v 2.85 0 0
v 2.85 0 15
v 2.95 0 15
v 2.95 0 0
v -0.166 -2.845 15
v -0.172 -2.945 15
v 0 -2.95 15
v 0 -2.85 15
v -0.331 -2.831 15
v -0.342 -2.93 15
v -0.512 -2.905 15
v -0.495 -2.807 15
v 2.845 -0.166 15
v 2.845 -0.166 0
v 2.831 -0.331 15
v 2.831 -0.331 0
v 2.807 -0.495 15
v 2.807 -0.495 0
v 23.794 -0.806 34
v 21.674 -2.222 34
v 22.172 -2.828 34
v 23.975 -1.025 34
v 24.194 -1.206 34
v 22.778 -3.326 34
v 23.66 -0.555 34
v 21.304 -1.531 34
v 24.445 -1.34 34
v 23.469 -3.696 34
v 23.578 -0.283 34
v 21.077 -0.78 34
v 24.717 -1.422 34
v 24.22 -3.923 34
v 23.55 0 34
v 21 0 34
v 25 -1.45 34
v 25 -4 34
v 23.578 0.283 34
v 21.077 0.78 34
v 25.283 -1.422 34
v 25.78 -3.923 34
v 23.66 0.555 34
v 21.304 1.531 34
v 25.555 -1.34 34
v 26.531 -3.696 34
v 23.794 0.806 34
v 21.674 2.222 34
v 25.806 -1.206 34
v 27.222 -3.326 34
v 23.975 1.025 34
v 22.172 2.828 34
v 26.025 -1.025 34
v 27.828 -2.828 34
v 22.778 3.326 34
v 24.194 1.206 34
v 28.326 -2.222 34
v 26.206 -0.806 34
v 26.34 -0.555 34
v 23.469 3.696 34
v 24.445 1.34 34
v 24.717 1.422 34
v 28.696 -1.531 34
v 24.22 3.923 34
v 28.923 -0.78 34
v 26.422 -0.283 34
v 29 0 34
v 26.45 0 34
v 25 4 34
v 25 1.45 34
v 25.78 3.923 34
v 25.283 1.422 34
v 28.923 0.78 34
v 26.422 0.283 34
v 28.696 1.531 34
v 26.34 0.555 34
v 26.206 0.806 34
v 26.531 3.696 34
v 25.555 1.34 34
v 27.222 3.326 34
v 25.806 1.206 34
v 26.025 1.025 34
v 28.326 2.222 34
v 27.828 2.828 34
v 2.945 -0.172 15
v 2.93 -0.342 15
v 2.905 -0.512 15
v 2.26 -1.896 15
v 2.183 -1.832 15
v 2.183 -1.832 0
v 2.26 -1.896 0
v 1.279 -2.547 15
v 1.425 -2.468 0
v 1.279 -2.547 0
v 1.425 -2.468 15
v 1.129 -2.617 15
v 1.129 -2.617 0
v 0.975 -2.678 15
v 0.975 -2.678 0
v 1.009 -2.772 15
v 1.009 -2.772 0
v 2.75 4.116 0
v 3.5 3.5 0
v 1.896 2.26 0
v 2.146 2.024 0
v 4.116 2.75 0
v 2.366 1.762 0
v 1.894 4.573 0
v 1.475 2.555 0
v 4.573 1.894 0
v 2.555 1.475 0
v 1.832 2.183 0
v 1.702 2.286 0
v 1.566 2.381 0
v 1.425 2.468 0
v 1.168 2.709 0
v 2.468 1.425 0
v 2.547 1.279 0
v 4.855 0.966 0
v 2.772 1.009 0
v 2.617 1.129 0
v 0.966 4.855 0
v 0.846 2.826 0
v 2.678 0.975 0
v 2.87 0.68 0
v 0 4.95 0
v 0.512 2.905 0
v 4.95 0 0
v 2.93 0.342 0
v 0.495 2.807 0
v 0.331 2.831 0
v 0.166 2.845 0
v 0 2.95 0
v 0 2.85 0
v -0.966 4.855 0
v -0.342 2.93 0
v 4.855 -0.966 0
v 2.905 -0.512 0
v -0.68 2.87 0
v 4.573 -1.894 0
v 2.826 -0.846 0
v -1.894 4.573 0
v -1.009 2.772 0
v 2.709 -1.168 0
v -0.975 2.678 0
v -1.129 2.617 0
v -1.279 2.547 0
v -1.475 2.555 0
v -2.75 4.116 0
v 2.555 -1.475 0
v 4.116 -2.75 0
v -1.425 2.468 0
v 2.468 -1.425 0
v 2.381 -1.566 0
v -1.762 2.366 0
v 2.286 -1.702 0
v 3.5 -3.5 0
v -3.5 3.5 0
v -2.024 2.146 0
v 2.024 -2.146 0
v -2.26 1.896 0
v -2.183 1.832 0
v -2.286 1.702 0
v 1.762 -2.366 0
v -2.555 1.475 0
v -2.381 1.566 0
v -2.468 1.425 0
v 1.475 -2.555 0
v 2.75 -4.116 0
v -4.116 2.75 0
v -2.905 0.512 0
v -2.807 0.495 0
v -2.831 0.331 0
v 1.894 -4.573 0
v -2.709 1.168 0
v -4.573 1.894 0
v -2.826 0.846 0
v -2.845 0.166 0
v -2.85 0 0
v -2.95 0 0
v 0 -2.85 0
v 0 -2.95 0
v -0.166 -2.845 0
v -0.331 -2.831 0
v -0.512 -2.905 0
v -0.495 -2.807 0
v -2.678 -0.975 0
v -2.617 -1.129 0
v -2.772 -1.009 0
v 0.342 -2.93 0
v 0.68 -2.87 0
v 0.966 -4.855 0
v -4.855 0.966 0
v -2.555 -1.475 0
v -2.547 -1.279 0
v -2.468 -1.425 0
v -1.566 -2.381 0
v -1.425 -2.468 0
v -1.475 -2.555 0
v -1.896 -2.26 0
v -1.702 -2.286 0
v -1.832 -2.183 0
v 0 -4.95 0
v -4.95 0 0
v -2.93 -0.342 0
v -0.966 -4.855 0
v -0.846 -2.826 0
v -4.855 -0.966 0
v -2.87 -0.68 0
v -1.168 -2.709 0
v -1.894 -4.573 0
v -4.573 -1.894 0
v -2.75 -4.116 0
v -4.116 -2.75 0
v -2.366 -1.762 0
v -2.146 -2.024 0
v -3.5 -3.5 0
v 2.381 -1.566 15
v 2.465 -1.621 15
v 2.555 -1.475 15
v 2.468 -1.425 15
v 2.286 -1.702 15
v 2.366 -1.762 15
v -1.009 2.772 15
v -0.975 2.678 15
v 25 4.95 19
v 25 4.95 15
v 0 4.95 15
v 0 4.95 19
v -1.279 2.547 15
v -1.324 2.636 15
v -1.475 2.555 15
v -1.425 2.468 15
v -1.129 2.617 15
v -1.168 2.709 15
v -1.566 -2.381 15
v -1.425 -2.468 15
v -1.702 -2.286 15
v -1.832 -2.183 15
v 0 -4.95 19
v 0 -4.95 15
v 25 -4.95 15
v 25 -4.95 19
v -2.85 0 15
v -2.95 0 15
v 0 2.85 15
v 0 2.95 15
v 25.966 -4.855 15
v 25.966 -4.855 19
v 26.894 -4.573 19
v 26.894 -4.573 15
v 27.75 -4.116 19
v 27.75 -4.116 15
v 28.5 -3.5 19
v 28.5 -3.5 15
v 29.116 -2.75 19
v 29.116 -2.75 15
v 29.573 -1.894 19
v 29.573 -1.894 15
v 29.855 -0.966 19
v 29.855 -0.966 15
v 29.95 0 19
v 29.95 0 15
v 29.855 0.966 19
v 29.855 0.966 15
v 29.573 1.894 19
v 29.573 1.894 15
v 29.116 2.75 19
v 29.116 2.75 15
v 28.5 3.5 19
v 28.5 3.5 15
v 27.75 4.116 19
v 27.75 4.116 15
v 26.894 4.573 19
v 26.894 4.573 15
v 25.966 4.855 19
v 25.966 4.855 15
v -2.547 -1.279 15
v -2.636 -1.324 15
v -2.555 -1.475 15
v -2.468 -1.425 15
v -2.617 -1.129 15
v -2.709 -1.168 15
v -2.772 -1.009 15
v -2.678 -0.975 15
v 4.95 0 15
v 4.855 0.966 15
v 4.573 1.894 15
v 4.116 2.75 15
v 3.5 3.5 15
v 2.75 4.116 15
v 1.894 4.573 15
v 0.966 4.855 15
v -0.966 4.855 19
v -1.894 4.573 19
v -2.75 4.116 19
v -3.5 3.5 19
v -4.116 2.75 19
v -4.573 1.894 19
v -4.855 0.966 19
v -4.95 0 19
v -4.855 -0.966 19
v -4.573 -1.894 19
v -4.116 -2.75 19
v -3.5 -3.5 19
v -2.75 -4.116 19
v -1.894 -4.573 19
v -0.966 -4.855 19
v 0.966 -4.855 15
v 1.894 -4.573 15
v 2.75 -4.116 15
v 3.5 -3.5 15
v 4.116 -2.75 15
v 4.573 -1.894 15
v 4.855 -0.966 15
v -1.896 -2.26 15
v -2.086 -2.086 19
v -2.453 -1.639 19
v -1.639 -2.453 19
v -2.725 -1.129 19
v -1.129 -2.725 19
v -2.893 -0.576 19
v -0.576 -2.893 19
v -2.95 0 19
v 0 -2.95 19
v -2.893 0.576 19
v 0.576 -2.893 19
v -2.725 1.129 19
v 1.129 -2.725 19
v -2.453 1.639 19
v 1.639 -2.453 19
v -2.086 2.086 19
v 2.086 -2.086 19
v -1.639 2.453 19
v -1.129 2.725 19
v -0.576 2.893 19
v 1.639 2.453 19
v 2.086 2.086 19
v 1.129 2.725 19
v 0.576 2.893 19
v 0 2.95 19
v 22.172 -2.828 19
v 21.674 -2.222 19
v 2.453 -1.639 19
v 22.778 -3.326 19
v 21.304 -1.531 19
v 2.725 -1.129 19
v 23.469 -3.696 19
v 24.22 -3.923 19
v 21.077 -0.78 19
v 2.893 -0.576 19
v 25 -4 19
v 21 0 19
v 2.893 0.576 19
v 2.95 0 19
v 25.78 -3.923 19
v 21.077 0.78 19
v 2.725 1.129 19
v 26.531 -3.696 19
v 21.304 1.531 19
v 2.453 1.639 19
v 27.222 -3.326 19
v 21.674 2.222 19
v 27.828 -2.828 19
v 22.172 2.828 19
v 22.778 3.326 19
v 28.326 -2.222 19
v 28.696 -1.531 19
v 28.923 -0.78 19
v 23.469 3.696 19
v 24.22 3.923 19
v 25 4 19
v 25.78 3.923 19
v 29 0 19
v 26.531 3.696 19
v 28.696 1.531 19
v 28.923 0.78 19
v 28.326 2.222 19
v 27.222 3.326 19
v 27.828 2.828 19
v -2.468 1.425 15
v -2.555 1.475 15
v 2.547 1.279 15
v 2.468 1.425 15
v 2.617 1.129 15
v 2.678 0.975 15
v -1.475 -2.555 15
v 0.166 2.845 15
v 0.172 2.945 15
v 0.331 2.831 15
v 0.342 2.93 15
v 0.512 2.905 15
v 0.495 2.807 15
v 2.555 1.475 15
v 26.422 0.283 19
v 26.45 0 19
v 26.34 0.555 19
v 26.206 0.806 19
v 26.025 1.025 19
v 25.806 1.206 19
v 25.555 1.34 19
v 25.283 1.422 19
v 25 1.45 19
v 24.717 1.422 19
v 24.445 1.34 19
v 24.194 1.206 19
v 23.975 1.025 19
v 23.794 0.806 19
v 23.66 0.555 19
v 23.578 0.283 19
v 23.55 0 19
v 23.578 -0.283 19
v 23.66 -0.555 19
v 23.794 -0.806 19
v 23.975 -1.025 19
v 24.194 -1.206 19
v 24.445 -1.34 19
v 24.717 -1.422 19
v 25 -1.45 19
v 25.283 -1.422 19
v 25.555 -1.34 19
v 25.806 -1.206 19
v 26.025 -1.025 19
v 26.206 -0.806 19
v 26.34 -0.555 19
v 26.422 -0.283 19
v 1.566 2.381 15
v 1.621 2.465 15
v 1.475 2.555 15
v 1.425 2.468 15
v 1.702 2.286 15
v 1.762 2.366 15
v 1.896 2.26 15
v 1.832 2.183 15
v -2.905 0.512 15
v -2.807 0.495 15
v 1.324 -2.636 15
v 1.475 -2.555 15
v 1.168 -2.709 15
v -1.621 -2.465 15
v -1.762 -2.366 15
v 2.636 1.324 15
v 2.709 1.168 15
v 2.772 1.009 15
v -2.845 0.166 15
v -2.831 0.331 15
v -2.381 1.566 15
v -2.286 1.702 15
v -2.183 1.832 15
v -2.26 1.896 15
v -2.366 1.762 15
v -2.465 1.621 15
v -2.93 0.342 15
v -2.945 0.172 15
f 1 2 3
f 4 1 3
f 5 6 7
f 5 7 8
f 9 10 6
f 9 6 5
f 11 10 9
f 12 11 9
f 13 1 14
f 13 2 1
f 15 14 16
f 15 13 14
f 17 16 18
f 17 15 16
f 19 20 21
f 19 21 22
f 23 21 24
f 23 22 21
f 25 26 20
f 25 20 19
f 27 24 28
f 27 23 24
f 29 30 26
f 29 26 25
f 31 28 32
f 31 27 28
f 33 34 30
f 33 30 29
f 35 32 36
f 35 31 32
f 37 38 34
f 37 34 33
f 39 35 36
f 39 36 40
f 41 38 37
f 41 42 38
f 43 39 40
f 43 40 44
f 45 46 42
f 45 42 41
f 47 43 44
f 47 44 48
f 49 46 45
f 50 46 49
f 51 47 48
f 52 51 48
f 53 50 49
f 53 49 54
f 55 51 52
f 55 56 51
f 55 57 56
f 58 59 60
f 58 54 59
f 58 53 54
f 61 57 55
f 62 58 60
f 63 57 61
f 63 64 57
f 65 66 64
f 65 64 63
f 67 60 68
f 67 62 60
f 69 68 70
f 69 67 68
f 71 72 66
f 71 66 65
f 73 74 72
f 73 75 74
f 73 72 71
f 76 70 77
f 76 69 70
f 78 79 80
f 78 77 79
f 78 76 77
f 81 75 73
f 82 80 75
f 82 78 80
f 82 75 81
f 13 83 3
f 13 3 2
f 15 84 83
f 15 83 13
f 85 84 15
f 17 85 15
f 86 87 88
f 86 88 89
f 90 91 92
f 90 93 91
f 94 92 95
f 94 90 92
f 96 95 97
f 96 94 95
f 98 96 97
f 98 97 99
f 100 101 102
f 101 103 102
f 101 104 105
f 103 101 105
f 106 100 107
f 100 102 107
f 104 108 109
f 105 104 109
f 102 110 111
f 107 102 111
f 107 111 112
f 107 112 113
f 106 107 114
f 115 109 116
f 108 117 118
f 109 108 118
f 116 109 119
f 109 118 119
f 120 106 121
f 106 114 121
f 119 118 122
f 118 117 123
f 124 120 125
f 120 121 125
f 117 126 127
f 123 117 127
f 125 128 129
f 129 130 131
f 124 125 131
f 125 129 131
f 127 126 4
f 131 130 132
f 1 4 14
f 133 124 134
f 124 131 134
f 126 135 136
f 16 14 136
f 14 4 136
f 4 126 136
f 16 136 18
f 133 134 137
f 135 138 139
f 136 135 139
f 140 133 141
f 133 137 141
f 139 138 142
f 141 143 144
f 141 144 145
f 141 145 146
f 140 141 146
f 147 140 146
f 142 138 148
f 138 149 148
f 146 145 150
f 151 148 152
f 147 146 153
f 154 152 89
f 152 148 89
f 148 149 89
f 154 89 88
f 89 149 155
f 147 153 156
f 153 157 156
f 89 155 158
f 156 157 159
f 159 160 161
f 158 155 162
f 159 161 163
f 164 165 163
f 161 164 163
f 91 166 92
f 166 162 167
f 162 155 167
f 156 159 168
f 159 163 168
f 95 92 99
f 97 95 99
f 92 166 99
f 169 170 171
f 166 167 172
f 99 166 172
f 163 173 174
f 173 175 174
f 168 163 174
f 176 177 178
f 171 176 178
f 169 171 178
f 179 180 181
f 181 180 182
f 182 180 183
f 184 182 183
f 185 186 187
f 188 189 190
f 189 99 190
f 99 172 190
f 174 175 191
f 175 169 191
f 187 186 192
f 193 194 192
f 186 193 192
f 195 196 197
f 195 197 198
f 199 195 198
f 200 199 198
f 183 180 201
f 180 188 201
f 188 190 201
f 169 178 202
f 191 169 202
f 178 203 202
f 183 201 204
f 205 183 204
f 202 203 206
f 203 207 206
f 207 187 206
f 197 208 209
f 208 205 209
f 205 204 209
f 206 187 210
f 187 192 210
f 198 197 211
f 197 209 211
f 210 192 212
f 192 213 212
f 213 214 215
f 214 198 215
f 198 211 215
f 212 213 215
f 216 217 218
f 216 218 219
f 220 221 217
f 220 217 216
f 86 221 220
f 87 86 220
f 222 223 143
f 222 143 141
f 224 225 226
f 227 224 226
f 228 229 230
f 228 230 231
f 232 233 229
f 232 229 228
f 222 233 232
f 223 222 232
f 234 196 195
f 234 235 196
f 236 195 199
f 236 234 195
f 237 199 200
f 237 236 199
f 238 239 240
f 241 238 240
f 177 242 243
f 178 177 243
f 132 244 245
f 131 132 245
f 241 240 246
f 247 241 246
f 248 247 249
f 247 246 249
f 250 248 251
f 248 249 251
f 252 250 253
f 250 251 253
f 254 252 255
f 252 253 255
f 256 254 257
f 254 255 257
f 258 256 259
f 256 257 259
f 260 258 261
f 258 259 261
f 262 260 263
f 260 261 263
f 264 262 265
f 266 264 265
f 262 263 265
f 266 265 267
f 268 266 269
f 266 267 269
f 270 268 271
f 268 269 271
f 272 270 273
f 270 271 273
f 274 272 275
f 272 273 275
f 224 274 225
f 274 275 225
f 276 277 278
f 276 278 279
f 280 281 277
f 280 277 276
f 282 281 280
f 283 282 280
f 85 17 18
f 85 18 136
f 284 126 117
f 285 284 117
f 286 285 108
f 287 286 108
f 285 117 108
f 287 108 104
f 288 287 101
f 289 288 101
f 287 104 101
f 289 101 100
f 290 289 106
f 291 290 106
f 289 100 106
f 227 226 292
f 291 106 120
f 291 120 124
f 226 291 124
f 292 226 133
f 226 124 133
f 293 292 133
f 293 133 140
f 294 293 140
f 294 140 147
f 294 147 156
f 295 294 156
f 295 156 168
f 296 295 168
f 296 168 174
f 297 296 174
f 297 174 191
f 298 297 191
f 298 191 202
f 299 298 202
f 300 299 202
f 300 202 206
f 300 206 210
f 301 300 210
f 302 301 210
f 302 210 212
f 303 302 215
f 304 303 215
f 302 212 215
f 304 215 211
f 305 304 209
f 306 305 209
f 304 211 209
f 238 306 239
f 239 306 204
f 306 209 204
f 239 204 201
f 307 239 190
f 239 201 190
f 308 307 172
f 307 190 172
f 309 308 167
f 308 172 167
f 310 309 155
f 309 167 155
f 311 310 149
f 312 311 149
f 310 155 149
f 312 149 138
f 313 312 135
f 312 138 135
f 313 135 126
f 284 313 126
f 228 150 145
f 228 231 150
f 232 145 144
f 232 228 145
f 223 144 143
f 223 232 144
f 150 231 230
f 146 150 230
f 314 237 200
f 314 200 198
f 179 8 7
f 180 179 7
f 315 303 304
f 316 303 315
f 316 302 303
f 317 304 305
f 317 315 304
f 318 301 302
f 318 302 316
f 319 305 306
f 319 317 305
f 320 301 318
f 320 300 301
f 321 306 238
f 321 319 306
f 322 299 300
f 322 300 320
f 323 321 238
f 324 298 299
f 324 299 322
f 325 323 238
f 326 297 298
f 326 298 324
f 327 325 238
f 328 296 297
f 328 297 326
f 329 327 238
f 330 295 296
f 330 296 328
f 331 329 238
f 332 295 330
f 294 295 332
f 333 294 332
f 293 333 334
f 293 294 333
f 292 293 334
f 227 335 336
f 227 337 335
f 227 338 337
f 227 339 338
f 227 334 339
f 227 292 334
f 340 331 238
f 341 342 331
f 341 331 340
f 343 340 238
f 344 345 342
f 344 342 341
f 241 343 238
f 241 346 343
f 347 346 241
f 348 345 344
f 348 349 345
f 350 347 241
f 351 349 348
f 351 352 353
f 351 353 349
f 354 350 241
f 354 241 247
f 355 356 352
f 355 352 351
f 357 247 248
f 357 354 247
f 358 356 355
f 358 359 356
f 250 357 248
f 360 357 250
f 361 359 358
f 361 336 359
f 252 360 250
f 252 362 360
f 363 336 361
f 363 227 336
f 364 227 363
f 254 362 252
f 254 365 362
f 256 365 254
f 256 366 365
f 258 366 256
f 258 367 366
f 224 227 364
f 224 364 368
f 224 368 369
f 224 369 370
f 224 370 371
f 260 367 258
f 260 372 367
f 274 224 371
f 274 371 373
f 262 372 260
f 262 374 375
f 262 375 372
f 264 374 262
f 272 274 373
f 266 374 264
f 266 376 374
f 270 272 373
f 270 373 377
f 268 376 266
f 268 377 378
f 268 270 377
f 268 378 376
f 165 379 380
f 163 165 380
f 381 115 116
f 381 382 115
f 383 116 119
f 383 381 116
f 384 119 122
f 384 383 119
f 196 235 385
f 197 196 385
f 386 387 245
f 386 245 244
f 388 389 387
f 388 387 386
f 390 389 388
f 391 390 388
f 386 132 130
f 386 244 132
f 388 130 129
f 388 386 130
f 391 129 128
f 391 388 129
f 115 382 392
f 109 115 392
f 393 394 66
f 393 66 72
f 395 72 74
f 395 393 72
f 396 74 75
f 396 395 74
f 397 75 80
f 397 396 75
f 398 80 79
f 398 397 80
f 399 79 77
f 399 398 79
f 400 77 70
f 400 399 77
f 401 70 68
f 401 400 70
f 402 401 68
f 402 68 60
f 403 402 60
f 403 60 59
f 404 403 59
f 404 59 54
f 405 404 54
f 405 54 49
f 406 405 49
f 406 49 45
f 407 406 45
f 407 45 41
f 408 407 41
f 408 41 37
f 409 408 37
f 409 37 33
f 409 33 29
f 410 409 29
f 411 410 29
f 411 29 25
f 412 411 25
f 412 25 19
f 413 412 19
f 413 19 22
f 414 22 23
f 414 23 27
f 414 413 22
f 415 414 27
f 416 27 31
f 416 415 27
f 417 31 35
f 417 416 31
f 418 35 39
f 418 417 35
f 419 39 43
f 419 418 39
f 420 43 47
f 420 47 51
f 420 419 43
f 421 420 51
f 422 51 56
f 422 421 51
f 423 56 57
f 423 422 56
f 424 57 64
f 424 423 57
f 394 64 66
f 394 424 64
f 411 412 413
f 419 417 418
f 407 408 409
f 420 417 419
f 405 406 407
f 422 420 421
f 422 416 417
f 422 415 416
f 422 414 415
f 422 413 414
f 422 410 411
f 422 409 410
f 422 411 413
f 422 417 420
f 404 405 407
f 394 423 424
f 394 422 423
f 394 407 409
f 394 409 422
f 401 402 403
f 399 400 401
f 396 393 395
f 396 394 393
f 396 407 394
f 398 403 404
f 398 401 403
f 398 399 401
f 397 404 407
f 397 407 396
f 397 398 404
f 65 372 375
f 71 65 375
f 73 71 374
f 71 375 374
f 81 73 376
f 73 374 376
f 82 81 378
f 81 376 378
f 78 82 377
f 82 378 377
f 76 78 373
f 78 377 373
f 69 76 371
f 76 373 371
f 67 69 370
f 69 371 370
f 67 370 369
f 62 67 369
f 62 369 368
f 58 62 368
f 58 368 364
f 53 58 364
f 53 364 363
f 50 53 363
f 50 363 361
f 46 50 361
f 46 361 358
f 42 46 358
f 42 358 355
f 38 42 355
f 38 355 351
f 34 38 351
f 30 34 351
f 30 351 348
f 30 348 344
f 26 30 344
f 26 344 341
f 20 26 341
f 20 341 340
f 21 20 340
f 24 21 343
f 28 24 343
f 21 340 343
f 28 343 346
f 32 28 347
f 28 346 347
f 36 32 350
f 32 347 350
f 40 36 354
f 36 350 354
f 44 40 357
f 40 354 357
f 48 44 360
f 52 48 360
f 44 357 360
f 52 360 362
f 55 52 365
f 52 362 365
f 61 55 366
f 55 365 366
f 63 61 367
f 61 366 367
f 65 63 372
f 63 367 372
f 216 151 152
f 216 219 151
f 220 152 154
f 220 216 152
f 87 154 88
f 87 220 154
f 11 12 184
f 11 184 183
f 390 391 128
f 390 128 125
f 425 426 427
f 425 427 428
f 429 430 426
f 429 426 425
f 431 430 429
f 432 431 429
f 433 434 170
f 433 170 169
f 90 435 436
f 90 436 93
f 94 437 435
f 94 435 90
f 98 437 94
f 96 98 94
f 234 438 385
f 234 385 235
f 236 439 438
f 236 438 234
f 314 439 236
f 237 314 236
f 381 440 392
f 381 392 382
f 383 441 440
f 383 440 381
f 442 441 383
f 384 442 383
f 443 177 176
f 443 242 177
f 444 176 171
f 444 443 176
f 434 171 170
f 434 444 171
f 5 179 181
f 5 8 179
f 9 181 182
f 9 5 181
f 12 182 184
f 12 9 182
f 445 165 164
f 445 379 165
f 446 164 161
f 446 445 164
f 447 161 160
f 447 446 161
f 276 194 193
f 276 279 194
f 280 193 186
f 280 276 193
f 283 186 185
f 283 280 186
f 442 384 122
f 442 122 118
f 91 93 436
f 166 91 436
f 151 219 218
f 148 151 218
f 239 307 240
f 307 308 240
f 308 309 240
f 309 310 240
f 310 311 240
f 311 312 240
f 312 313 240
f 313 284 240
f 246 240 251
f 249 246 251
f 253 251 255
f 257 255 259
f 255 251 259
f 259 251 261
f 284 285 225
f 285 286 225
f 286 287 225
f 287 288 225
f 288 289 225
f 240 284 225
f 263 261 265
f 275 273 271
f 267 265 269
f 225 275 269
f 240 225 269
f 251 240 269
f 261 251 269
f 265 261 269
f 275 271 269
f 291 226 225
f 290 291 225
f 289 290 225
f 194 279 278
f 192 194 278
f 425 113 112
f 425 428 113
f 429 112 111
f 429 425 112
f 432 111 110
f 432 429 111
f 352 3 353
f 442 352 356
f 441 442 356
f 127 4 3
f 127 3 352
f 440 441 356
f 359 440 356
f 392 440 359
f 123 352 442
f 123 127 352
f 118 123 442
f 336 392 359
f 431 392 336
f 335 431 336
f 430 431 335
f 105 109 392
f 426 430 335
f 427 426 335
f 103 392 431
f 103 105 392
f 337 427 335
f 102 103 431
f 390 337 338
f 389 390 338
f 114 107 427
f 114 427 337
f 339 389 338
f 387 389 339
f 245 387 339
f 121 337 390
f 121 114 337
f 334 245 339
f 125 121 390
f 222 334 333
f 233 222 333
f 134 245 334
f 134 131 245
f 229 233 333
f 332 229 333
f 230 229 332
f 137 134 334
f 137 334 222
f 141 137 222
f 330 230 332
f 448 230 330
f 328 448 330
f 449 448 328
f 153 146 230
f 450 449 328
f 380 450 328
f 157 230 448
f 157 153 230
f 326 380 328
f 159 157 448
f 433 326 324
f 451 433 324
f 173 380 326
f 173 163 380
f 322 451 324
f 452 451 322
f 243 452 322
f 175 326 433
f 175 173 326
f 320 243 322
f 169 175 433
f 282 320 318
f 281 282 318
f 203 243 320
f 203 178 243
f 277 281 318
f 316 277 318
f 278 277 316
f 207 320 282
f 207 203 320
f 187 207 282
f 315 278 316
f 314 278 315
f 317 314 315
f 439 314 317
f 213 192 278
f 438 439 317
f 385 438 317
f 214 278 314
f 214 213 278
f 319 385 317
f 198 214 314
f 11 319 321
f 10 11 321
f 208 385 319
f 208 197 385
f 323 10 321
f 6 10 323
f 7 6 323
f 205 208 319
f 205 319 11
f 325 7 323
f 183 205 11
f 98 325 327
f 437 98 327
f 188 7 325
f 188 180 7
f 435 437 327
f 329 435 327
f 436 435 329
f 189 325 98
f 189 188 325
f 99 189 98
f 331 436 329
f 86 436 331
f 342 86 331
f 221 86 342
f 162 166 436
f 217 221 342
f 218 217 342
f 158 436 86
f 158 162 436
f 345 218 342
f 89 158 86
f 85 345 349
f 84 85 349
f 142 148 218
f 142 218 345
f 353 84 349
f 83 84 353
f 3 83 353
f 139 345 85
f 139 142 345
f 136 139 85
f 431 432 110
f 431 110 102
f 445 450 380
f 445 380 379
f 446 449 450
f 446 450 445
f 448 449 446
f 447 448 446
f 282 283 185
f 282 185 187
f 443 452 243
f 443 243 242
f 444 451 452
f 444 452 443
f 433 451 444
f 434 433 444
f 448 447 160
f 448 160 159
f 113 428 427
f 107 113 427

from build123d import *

# Parameters (mm, degrees)
SKETCH005_R        = 2.95
PAD005_DEPTH       = 4
SKETCH007_R        = 4
SKETCH007_R_2      = 1.45
PAD006_DEPTH       = 19
SKETCH016_R        = 4.95
SKETCH016_R_2      = 2.95
PAD015_DEPTH       = 15
SKETCH008_W        = 0.1
SKETCH008_H        = 15
REVOLUTION_ANGLE   = -10
POLARPATTERN_COUNT = 12


with BuildPart() as part:
    # Sketch005 → Pad005 (new body)
    with BuildSketch(Plane.XY.offset(15)):
        with BuildLine():
            ThreePointArc((0, 4.95), (-4.95, 0), (0, -4.95))
            Line((0, -4.95), (25, -4.95))
            ThreePointArc((25, -4.95), (29.95, 0), (25, 4.95))
            Line((25, 4.95), (0, 4.95))
        make_face()
        Circle(SKETCH005_R, mode=Mode.SUBTRACT)
    extrude(amount=PAD005_DEPTH)

    # Sketch007 → Pad006 (join)
    with BuildSketch(Plane.XY.offset(15)):
        with Locations((25, 0)):
            Circle(SKETCH007_R)
        with Locations((25, 0)):
            Circle(SKETCH007_R_2, mode=Mode.SUBTRACT)
    extrude(amount=PAD006_DEPTH)

    # Sketch016 → Pad015 (join)
    with BuildSketch(Plane.XY):
        Circle(SKETCH016_R)
        Circle(SKETCH016_R_2, mode=Mode.SUBTRACT)
    extrude(amount=PAD015_DEPTH)

    # Sketch008 → Revolution (revolve)
    with BuildSketch(Plane.XZ):
        with Locations((2.9, 7.5)):
            Rectangle(SKETCH008_W, SKETCH008_H)
    revolution = revolve(axis=Axis((0, 0, 0), (0, 0, 1)), revolution_arc=REVOLUTION_ANGLE)

    # PolarPattern: Revolution ×12 about axis
    polarpattern_axis = Axis((0, 0, 0), (0, 0, 1))
    for i in range(1, POLARPATTERN_COUNT):
        add(revolution.rotate(polarpattern_axis, i * 360 / POLARPATTERN_COUNT))


solid = part.part
